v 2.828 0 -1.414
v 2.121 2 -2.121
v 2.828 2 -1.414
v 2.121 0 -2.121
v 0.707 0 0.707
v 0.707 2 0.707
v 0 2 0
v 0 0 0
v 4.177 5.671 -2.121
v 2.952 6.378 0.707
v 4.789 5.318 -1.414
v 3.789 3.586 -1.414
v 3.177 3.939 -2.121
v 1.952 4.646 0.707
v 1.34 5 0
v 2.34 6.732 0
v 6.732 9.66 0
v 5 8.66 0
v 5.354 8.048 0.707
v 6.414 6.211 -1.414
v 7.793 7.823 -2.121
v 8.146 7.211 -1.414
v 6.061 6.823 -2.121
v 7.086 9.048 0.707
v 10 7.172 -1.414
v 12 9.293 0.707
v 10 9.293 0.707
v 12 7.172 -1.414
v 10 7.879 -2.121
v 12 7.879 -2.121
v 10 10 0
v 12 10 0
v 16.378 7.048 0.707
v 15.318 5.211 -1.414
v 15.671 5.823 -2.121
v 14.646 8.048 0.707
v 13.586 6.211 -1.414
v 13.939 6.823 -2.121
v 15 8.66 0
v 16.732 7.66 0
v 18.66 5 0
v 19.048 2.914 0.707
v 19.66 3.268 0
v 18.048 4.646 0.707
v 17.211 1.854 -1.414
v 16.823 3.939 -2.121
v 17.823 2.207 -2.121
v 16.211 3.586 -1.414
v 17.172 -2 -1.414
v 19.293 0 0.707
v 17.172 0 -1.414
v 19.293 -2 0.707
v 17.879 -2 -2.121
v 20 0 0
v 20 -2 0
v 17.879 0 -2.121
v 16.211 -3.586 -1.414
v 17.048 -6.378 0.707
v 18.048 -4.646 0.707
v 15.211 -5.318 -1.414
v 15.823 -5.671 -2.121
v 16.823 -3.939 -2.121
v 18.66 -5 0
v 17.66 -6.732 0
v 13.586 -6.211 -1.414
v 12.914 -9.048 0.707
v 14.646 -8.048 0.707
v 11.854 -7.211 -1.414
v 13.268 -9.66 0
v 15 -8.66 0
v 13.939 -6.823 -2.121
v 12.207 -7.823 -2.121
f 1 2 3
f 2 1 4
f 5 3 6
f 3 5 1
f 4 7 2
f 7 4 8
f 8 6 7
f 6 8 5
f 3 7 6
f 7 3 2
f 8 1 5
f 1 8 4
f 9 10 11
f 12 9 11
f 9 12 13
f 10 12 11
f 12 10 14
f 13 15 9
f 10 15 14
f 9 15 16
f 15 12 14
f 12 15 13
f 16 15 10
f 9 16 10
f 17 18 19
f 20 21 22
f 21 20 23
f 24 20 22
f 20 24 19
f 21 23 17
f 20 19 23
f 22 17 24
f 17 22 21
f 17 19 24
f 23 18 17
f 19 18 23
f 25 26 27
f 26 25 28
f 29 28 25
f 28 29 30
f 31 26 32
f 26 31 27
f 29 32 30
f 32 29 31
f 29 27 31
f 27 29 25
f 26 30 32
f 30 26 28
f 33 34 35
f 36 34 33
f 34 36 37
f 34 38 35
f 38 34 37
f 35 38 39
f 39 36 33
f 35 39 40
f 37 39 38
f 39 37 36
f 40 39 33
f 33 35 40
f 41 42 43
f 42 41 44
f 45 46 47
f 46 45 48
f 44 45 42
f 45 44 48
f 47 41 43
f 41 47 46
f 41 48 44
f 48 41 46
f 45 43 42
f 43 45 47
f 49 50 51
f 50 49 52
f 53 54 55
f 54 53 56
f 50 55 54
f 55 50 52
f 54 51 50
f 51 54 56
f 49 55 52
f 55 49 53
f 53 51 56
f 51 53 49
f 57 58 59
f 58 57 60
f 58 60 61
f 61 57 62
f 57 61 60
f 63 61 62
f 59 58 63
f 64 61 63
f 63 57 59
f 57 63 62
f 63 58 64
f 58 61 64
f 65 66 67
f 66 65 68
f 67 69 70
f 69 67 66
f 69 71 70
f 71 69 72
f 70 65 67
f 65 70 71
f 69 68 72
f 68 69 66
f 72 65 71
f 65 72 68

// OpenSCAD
/**
 * on_arc.scad
 *
 * Use this module to place a child object along an arc, rotated at the correct angle
 * to maintain association with the arc's focal point.
 *
 * This OpenSCAD library is part of the [dotscad](https://github.com/dotscad/dotscad)
 * project.
 *
 * @copyright  Chris Petersen, 2013
 * @license    http://creativecommons.org/licenses/LGPL/2.1/
 * @license    http://creativecommons.org/licenses/by-sa/3.0/
 *
 * @see        http://www.thingiverse.com/thing:118648
 * @source     https://github.com/dotscad/dotscad/blob/master/on_arc.scad
 *
 * @param float radius Radius of the arc
 * @param float angle  Angle along the arc to place the child object
 */
module on_arc(radius, angle) {
    x = radius - radius * cos(angle);
    y = radius * sin(angle);
    translate([x,y,0])
        rotate([0,0,-angle])
            child(0);
}

/*
 * When this file is opened directly in OpenSCAD, the following code will render an
 * example of the functions it provides.  This example will *not* render if this module
 * is imported into your own project via the `use` statement.
 */
on_arc_example();
module on_arc_example() {
    union() {
        for(a = [0 : 30 : 260]) {
            on_arc(10, a) rotate([0,45,0]) cube([3,2,1]);
        }
    }
}
